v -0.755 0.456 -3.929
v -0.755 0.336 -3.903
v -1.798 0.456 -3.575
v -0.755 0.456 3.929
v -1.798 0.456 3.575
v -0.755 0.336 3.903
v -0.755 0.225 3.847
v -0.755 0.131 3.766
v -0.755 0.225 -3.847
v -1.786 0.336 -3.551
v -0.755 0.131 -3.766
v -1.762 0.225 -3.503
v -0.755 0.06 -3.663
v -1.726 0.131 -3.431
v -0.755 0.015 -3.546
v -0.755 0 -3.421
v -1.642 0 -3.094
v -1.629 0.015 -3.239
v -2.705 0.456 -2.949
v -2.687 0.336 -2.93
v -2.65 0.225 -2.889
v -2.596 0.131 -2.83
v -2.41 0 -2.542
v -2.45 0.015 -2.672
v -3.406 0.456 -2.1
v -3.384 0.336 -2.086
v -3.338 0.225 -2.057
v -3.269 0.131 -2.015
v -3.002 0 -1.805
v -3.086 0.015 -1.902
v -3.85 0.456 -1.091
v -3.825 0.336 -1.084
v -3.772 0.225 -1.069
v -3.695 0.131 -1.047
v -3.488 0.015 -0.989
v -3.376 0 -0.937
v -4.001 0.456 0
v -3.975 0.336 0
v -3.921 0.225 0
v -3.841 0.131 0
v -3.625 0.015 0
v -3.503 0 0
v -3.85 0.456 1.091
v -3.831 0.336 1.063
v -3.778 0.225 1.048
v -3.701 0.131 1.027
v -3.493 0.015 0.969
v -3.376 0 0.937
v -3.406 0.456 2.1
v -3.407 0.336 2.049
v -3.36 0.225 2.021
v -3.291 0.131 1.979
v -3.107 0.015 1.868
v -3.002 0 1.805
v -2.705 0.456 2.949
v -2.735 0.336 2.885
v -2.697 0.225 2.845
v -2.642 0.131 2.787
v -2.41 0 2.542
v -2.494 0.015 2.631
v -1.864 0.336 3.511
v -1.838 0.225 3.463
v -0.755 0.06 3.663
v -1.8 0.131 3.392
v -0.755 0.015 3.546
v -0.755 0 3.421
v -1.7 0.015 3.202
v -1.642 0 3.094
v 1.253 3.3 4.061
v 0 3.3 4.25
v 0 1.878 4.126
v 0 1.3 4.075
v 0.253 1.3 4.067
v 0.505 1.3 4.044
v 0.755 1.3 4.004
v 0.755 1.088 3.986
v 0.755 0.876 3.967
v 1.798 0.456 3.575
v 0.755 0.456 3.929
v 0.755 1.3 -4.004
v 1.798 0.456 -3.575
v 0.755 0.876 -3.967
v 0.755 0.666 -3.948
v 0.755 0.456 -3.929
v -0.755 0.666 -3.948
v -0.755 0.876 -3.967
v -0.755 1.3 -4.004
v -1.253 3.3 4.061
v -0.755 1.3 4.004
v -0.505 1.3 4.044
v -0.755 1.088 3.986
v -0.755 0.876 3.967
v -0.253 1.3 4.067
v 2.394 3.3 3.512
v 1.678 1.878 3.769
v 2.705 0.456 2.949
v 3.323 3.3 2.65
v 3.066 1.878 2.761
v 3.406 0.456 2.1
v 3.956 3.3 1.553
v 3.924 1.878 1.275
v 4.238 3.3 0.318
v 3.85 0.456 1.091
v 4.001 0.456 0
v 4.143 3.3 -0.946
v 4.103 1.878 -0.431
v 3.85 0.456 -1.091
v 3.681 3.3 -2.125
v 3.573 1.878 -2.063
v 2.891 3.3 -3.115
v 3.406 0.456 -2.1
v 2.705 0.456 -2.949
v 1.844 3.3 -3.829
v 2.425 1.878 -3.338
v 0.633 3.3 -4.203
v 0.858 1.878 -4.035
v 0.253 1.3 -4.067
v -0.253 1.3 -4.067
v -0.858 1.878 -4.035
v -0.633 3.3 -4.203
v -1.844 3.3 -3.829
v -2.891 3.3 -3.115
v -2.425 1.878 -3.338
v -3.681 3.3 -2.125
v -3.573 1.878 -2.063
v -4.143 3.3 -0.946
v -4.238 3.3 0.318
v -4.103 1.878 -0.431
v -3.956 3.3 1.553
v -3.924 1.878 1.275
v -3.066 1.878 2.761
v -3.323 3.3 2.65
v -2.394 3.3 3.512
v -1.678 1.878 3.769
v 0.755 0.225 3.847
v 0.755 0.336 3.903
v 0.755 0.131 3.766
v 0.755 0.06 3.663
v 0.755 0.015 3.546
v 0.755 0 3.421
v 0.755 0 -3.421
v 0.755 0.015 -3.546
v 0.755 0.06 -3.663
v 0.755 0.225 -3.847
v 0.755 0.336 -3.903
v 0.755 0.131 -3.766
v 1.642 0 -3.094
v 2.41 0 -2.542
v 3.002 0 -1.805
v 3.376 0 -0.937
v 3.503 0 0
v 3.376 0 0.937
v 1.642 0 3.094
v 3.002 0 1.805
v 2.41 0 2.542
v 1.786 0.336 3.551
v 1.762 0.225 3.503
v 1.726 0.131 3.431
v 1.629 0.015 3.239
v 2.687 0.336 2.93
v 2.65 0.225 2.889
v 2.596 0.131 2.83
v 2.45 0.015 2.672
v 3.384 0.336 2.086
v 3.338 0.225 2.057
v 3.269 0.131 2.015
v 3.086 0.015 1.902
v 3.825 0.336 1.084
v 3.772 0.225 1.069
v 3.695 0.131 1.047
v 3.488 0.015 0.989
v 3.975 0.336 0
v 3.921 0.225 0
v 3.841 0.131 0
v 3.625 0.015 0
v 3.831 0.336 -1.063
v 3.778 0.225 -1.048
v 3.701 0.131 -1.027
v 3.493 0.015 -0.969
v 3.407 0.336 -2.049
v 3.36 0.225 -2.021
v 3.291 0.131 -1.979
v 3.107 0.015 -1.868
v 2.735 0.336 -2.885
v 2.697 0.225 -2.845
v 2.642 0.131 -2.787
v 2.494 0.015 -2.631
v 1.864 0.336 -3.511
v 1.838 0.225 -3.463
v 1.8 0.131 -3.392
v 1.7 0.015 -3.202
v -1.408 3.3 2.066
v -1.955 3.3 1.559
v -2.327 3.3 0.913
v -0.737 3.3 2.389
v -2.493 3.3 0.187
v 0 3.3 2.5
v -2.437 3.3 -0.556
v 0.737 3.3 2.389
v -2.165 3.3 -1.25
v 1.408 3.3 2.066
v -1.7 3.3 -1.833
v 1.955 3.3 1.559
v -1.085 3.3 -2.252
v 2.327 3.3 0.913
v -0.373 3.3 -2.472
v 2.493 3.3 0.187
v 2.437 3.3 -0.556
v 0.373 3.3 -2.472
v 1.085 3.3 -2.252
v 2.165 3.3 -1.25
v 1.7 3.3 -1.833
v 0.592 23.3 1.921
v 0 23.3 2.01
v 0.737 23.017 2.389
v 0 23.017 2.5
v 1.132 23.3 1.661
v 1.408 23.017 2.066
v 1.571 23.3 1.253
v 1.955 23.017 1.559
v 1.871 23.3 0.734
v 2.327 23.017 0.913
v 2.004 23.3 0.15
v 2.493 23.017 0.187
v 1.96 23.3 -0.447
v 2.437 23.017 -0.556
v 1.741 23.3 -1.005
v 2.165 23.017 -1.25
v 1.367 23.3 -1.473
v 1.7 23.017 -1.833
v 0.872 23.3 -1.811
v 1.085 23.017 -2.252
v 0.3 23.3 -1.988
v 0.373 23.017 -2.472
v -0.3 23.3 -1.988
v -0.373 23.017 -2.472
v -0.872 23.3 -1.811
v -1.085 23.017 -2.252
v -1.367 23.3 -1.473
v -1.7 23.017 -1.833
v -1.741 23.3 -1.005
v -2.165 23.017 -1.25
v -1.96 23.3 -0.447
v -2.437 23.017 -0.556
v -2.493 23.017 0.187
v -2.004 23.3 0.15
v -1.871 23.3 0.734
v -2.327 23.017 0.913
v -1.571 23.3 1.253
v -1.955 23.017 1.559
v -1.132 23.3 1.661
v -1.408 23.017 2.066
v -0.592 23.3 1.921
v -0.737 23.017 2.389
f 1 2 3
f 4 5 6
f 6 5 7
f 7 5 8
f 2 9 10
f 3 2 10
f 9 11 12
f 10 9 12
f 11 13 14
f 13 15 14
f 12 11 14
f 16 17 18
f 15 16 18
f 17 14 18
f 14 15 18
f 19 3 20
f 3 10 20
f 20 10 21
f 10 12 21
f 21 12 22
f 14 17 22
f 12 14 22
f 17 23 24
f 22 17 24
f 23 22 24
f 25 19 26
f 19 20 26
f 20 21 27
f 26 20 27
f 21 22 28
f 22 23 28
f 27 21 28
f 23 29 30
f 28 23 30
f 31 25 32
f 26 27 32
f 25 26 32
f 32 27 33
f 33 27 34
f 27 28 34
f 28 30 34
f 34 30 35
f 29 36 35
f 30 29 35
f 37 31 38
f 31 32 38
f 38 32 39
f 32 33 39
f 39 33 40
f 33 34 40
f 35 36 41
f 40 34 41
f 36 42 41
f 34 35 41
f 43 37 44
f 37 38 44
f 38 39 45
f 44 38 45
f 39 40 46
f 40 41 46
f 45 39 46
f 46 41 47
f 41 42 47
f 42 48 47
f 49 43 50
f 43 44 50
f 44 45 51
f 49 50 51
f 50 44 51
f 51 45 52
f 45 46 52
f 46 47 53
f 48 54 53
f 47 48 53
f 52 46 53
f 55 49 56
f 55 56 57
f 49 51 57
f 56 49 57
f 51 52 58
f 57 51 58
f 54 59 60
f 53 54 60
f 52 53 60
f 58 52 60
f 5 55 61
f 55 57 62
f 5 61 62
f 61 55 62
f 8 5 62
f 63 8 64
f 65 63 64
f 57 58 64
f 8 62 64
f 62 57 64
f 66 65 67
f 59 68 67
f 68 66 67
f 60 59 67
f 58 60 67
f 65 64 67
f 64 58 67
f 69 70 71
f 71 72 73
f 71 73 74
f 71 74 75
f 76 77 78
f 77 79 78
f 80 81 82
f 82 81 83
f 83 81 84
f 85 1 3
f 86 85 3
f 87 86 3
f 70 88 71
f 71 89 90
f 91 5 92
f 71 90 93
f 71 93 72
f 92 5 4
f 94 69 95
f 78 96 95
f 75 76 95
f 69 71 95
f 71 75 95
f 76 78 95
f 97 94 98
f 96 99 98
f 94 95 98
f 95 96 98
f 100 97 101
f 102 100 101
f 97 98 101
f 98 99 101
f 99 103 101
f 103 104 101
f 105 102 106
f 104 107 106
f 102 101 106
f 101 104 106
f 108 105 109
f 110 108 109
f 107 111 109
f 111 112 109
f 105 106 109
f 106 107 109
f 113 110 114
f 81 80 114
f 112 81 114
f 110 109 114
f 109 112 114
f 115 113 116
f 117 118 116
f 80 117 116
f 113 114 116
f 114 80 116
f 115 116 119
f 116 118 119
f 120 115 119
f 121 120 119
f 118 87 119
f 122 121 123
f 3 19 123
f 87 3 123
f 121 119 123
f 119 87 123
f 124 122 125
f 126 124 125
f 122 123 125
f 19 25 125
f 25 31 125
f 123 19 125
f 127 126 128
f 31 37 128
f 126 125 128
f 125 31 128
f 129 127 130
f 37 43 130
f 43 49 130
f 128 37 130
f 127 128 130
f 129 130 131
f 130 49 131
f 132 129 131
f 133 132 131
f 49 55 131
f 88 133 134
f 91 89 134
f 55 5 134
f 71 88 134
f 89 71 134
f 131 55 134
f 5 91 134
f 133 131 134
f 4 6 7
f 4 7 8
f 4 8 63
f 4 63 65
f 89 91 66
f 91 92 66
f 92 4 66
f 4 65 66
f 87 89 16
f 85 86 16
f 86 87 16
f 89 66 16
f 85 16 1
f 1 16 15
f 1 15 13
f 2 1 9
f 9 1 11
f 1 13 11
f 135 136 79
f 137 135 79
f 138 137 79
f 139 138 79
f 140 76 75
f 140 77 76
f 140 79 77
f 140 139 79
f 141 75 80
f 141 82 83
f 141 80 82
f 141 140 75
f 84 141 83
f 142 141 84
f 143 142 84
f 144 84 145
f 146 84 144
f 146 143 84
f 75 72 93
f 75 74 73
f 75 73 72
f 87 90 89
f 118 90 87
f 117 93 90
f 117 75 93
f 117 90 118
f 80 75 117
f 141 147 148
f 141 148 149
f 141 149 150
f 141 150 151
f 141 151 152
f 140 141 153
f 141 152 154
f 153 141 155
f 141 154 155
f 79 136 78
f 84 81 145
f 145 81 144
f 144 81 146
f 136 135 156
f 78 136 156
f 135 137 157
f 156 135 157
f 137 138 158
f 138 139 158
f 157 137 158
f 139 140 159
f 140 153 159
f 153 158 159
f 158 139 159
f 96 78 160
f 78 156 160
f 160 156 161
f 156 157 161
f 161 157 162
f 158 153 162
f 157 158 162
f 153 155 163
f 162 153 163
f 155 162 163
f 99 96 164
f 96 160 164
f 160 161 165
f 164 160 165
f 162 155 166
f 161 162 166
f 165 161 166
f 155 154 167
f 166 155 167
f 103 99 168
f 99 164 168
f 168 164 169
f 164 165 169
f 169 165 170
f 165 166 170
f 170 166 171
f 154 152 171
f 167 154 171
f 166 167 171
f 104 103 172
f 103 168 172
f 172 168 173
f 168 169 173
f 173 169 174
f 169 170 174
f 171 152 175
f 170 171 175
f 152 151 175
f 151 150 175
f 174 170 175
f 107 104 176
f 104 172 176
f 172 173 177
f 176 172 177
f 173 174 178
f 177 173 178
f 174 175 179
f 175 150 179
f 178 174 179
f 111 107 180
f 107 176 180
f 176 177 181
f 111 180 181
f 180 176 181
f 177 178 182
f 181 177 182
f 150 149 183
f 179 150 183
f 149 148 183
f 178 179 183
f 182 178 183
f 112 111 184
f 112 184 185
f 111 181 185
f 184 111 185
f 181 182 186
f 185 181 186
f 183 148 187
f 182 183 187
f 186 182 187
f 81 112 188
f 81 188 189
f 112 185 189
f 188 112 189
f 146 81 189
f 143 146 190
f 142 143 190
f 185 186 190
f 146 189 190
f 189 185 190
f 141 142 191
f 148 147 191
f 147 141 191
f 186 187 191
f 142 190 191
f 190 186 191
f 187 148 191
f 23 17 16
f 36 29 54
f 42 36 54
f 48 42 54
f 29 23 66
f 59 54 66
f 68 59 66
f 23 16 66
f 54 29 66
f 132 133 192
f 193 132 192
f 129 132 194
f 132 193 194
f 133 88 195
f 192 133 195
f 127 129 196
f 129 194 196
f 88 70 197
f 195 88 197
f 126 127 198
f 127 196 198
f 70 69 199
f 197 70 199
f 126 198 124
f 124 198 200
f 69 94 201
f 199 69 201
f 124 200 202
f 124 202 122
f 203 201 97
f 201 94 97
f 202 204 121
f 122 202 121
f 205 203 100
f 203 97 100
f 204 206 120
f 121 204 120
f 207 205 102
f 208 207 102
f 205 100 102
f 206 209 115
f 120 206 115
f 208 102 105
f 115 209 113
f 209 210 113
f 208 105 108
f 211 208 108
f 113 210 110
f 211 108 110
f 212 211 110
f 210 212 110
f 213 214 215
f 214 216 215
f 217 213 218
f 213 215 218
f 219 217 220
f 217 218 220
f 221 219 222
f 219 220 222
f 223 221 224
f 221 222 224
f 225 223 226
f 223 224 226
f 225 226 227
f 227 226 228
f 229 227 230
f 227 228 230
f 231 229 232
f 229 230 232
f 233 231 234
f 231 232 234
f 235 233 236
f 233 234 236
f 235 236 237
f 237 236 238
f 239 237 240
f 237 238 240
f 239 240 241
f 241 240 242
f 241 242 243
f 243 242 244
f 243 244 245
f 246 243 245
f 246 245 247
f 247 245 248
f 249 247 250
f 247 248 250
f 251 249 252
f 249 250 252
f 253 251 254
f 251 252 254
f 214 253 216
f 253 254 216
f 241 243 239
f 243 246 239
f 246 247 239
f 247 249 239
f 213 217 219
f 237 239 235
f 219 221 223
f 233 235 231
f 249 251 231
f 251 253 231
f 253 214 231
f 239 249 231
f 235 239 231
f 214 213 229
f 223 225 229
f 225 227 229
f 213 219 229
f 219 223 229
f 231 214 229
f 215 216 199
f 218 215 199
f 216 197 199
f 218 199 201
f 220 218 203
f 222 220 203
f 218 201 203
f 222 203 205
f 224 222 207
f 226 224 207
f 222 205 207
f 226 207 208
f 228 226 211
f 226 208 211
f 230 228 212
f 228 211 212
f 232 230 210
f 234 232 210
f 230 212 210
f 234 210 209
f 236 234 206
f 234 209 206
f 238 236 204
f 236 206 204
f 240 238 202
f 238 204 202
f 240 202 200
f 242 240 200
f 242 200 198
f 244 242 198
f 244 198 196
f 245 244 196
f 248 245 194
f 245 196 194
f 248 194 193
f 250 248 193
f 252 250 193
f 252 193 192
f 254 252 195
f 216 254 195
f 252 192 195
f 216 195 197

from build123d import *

# Parameters (mm, degrees)
SKETCH001_W  = 8.5
SKETCH001_H  = 1.51
POCKET_DEPTH = 1.3


with BuildPart() as part:
    # Sketch → Revolution (revolve)
    with BuildSketch(Plane.YZ):
        with BuildLine():
            Line((0, 3.503122), (0, 0))
            Line((0, 0), (23.3, 0))
            Line((23.3, 0), (23.3, 2.01))
            Line((23.3, 2.01), (23.017098, 2.5))
            Line((23.017098, 2.5), (3.3, 2.5))
            Line((3.3, 2.5), (3.3, 4.25))
            Line((3.3, 4.25), (0.456422, 4.001219))
            ThreePointArc((0.456422, 4.001219), (0.131361, 3.840917), (0, 3.503122))
        make_face()
    revolve(axis=Axis((0, 0, 0), (0, 1, 0)))

    # Sketch001 → Pocket (cut)
    with BuildSketch(Plane(origin=(0, 0, 0), x_dir=(0, 0, -1), z_dir=(0, -1, 0))):
        Rectangle(SKETCH001_W, SKETCH001_H)
    extrude(amount=-POCKET_DEPTH, mode=Mode.SUBTRACT)


solid = part.part
